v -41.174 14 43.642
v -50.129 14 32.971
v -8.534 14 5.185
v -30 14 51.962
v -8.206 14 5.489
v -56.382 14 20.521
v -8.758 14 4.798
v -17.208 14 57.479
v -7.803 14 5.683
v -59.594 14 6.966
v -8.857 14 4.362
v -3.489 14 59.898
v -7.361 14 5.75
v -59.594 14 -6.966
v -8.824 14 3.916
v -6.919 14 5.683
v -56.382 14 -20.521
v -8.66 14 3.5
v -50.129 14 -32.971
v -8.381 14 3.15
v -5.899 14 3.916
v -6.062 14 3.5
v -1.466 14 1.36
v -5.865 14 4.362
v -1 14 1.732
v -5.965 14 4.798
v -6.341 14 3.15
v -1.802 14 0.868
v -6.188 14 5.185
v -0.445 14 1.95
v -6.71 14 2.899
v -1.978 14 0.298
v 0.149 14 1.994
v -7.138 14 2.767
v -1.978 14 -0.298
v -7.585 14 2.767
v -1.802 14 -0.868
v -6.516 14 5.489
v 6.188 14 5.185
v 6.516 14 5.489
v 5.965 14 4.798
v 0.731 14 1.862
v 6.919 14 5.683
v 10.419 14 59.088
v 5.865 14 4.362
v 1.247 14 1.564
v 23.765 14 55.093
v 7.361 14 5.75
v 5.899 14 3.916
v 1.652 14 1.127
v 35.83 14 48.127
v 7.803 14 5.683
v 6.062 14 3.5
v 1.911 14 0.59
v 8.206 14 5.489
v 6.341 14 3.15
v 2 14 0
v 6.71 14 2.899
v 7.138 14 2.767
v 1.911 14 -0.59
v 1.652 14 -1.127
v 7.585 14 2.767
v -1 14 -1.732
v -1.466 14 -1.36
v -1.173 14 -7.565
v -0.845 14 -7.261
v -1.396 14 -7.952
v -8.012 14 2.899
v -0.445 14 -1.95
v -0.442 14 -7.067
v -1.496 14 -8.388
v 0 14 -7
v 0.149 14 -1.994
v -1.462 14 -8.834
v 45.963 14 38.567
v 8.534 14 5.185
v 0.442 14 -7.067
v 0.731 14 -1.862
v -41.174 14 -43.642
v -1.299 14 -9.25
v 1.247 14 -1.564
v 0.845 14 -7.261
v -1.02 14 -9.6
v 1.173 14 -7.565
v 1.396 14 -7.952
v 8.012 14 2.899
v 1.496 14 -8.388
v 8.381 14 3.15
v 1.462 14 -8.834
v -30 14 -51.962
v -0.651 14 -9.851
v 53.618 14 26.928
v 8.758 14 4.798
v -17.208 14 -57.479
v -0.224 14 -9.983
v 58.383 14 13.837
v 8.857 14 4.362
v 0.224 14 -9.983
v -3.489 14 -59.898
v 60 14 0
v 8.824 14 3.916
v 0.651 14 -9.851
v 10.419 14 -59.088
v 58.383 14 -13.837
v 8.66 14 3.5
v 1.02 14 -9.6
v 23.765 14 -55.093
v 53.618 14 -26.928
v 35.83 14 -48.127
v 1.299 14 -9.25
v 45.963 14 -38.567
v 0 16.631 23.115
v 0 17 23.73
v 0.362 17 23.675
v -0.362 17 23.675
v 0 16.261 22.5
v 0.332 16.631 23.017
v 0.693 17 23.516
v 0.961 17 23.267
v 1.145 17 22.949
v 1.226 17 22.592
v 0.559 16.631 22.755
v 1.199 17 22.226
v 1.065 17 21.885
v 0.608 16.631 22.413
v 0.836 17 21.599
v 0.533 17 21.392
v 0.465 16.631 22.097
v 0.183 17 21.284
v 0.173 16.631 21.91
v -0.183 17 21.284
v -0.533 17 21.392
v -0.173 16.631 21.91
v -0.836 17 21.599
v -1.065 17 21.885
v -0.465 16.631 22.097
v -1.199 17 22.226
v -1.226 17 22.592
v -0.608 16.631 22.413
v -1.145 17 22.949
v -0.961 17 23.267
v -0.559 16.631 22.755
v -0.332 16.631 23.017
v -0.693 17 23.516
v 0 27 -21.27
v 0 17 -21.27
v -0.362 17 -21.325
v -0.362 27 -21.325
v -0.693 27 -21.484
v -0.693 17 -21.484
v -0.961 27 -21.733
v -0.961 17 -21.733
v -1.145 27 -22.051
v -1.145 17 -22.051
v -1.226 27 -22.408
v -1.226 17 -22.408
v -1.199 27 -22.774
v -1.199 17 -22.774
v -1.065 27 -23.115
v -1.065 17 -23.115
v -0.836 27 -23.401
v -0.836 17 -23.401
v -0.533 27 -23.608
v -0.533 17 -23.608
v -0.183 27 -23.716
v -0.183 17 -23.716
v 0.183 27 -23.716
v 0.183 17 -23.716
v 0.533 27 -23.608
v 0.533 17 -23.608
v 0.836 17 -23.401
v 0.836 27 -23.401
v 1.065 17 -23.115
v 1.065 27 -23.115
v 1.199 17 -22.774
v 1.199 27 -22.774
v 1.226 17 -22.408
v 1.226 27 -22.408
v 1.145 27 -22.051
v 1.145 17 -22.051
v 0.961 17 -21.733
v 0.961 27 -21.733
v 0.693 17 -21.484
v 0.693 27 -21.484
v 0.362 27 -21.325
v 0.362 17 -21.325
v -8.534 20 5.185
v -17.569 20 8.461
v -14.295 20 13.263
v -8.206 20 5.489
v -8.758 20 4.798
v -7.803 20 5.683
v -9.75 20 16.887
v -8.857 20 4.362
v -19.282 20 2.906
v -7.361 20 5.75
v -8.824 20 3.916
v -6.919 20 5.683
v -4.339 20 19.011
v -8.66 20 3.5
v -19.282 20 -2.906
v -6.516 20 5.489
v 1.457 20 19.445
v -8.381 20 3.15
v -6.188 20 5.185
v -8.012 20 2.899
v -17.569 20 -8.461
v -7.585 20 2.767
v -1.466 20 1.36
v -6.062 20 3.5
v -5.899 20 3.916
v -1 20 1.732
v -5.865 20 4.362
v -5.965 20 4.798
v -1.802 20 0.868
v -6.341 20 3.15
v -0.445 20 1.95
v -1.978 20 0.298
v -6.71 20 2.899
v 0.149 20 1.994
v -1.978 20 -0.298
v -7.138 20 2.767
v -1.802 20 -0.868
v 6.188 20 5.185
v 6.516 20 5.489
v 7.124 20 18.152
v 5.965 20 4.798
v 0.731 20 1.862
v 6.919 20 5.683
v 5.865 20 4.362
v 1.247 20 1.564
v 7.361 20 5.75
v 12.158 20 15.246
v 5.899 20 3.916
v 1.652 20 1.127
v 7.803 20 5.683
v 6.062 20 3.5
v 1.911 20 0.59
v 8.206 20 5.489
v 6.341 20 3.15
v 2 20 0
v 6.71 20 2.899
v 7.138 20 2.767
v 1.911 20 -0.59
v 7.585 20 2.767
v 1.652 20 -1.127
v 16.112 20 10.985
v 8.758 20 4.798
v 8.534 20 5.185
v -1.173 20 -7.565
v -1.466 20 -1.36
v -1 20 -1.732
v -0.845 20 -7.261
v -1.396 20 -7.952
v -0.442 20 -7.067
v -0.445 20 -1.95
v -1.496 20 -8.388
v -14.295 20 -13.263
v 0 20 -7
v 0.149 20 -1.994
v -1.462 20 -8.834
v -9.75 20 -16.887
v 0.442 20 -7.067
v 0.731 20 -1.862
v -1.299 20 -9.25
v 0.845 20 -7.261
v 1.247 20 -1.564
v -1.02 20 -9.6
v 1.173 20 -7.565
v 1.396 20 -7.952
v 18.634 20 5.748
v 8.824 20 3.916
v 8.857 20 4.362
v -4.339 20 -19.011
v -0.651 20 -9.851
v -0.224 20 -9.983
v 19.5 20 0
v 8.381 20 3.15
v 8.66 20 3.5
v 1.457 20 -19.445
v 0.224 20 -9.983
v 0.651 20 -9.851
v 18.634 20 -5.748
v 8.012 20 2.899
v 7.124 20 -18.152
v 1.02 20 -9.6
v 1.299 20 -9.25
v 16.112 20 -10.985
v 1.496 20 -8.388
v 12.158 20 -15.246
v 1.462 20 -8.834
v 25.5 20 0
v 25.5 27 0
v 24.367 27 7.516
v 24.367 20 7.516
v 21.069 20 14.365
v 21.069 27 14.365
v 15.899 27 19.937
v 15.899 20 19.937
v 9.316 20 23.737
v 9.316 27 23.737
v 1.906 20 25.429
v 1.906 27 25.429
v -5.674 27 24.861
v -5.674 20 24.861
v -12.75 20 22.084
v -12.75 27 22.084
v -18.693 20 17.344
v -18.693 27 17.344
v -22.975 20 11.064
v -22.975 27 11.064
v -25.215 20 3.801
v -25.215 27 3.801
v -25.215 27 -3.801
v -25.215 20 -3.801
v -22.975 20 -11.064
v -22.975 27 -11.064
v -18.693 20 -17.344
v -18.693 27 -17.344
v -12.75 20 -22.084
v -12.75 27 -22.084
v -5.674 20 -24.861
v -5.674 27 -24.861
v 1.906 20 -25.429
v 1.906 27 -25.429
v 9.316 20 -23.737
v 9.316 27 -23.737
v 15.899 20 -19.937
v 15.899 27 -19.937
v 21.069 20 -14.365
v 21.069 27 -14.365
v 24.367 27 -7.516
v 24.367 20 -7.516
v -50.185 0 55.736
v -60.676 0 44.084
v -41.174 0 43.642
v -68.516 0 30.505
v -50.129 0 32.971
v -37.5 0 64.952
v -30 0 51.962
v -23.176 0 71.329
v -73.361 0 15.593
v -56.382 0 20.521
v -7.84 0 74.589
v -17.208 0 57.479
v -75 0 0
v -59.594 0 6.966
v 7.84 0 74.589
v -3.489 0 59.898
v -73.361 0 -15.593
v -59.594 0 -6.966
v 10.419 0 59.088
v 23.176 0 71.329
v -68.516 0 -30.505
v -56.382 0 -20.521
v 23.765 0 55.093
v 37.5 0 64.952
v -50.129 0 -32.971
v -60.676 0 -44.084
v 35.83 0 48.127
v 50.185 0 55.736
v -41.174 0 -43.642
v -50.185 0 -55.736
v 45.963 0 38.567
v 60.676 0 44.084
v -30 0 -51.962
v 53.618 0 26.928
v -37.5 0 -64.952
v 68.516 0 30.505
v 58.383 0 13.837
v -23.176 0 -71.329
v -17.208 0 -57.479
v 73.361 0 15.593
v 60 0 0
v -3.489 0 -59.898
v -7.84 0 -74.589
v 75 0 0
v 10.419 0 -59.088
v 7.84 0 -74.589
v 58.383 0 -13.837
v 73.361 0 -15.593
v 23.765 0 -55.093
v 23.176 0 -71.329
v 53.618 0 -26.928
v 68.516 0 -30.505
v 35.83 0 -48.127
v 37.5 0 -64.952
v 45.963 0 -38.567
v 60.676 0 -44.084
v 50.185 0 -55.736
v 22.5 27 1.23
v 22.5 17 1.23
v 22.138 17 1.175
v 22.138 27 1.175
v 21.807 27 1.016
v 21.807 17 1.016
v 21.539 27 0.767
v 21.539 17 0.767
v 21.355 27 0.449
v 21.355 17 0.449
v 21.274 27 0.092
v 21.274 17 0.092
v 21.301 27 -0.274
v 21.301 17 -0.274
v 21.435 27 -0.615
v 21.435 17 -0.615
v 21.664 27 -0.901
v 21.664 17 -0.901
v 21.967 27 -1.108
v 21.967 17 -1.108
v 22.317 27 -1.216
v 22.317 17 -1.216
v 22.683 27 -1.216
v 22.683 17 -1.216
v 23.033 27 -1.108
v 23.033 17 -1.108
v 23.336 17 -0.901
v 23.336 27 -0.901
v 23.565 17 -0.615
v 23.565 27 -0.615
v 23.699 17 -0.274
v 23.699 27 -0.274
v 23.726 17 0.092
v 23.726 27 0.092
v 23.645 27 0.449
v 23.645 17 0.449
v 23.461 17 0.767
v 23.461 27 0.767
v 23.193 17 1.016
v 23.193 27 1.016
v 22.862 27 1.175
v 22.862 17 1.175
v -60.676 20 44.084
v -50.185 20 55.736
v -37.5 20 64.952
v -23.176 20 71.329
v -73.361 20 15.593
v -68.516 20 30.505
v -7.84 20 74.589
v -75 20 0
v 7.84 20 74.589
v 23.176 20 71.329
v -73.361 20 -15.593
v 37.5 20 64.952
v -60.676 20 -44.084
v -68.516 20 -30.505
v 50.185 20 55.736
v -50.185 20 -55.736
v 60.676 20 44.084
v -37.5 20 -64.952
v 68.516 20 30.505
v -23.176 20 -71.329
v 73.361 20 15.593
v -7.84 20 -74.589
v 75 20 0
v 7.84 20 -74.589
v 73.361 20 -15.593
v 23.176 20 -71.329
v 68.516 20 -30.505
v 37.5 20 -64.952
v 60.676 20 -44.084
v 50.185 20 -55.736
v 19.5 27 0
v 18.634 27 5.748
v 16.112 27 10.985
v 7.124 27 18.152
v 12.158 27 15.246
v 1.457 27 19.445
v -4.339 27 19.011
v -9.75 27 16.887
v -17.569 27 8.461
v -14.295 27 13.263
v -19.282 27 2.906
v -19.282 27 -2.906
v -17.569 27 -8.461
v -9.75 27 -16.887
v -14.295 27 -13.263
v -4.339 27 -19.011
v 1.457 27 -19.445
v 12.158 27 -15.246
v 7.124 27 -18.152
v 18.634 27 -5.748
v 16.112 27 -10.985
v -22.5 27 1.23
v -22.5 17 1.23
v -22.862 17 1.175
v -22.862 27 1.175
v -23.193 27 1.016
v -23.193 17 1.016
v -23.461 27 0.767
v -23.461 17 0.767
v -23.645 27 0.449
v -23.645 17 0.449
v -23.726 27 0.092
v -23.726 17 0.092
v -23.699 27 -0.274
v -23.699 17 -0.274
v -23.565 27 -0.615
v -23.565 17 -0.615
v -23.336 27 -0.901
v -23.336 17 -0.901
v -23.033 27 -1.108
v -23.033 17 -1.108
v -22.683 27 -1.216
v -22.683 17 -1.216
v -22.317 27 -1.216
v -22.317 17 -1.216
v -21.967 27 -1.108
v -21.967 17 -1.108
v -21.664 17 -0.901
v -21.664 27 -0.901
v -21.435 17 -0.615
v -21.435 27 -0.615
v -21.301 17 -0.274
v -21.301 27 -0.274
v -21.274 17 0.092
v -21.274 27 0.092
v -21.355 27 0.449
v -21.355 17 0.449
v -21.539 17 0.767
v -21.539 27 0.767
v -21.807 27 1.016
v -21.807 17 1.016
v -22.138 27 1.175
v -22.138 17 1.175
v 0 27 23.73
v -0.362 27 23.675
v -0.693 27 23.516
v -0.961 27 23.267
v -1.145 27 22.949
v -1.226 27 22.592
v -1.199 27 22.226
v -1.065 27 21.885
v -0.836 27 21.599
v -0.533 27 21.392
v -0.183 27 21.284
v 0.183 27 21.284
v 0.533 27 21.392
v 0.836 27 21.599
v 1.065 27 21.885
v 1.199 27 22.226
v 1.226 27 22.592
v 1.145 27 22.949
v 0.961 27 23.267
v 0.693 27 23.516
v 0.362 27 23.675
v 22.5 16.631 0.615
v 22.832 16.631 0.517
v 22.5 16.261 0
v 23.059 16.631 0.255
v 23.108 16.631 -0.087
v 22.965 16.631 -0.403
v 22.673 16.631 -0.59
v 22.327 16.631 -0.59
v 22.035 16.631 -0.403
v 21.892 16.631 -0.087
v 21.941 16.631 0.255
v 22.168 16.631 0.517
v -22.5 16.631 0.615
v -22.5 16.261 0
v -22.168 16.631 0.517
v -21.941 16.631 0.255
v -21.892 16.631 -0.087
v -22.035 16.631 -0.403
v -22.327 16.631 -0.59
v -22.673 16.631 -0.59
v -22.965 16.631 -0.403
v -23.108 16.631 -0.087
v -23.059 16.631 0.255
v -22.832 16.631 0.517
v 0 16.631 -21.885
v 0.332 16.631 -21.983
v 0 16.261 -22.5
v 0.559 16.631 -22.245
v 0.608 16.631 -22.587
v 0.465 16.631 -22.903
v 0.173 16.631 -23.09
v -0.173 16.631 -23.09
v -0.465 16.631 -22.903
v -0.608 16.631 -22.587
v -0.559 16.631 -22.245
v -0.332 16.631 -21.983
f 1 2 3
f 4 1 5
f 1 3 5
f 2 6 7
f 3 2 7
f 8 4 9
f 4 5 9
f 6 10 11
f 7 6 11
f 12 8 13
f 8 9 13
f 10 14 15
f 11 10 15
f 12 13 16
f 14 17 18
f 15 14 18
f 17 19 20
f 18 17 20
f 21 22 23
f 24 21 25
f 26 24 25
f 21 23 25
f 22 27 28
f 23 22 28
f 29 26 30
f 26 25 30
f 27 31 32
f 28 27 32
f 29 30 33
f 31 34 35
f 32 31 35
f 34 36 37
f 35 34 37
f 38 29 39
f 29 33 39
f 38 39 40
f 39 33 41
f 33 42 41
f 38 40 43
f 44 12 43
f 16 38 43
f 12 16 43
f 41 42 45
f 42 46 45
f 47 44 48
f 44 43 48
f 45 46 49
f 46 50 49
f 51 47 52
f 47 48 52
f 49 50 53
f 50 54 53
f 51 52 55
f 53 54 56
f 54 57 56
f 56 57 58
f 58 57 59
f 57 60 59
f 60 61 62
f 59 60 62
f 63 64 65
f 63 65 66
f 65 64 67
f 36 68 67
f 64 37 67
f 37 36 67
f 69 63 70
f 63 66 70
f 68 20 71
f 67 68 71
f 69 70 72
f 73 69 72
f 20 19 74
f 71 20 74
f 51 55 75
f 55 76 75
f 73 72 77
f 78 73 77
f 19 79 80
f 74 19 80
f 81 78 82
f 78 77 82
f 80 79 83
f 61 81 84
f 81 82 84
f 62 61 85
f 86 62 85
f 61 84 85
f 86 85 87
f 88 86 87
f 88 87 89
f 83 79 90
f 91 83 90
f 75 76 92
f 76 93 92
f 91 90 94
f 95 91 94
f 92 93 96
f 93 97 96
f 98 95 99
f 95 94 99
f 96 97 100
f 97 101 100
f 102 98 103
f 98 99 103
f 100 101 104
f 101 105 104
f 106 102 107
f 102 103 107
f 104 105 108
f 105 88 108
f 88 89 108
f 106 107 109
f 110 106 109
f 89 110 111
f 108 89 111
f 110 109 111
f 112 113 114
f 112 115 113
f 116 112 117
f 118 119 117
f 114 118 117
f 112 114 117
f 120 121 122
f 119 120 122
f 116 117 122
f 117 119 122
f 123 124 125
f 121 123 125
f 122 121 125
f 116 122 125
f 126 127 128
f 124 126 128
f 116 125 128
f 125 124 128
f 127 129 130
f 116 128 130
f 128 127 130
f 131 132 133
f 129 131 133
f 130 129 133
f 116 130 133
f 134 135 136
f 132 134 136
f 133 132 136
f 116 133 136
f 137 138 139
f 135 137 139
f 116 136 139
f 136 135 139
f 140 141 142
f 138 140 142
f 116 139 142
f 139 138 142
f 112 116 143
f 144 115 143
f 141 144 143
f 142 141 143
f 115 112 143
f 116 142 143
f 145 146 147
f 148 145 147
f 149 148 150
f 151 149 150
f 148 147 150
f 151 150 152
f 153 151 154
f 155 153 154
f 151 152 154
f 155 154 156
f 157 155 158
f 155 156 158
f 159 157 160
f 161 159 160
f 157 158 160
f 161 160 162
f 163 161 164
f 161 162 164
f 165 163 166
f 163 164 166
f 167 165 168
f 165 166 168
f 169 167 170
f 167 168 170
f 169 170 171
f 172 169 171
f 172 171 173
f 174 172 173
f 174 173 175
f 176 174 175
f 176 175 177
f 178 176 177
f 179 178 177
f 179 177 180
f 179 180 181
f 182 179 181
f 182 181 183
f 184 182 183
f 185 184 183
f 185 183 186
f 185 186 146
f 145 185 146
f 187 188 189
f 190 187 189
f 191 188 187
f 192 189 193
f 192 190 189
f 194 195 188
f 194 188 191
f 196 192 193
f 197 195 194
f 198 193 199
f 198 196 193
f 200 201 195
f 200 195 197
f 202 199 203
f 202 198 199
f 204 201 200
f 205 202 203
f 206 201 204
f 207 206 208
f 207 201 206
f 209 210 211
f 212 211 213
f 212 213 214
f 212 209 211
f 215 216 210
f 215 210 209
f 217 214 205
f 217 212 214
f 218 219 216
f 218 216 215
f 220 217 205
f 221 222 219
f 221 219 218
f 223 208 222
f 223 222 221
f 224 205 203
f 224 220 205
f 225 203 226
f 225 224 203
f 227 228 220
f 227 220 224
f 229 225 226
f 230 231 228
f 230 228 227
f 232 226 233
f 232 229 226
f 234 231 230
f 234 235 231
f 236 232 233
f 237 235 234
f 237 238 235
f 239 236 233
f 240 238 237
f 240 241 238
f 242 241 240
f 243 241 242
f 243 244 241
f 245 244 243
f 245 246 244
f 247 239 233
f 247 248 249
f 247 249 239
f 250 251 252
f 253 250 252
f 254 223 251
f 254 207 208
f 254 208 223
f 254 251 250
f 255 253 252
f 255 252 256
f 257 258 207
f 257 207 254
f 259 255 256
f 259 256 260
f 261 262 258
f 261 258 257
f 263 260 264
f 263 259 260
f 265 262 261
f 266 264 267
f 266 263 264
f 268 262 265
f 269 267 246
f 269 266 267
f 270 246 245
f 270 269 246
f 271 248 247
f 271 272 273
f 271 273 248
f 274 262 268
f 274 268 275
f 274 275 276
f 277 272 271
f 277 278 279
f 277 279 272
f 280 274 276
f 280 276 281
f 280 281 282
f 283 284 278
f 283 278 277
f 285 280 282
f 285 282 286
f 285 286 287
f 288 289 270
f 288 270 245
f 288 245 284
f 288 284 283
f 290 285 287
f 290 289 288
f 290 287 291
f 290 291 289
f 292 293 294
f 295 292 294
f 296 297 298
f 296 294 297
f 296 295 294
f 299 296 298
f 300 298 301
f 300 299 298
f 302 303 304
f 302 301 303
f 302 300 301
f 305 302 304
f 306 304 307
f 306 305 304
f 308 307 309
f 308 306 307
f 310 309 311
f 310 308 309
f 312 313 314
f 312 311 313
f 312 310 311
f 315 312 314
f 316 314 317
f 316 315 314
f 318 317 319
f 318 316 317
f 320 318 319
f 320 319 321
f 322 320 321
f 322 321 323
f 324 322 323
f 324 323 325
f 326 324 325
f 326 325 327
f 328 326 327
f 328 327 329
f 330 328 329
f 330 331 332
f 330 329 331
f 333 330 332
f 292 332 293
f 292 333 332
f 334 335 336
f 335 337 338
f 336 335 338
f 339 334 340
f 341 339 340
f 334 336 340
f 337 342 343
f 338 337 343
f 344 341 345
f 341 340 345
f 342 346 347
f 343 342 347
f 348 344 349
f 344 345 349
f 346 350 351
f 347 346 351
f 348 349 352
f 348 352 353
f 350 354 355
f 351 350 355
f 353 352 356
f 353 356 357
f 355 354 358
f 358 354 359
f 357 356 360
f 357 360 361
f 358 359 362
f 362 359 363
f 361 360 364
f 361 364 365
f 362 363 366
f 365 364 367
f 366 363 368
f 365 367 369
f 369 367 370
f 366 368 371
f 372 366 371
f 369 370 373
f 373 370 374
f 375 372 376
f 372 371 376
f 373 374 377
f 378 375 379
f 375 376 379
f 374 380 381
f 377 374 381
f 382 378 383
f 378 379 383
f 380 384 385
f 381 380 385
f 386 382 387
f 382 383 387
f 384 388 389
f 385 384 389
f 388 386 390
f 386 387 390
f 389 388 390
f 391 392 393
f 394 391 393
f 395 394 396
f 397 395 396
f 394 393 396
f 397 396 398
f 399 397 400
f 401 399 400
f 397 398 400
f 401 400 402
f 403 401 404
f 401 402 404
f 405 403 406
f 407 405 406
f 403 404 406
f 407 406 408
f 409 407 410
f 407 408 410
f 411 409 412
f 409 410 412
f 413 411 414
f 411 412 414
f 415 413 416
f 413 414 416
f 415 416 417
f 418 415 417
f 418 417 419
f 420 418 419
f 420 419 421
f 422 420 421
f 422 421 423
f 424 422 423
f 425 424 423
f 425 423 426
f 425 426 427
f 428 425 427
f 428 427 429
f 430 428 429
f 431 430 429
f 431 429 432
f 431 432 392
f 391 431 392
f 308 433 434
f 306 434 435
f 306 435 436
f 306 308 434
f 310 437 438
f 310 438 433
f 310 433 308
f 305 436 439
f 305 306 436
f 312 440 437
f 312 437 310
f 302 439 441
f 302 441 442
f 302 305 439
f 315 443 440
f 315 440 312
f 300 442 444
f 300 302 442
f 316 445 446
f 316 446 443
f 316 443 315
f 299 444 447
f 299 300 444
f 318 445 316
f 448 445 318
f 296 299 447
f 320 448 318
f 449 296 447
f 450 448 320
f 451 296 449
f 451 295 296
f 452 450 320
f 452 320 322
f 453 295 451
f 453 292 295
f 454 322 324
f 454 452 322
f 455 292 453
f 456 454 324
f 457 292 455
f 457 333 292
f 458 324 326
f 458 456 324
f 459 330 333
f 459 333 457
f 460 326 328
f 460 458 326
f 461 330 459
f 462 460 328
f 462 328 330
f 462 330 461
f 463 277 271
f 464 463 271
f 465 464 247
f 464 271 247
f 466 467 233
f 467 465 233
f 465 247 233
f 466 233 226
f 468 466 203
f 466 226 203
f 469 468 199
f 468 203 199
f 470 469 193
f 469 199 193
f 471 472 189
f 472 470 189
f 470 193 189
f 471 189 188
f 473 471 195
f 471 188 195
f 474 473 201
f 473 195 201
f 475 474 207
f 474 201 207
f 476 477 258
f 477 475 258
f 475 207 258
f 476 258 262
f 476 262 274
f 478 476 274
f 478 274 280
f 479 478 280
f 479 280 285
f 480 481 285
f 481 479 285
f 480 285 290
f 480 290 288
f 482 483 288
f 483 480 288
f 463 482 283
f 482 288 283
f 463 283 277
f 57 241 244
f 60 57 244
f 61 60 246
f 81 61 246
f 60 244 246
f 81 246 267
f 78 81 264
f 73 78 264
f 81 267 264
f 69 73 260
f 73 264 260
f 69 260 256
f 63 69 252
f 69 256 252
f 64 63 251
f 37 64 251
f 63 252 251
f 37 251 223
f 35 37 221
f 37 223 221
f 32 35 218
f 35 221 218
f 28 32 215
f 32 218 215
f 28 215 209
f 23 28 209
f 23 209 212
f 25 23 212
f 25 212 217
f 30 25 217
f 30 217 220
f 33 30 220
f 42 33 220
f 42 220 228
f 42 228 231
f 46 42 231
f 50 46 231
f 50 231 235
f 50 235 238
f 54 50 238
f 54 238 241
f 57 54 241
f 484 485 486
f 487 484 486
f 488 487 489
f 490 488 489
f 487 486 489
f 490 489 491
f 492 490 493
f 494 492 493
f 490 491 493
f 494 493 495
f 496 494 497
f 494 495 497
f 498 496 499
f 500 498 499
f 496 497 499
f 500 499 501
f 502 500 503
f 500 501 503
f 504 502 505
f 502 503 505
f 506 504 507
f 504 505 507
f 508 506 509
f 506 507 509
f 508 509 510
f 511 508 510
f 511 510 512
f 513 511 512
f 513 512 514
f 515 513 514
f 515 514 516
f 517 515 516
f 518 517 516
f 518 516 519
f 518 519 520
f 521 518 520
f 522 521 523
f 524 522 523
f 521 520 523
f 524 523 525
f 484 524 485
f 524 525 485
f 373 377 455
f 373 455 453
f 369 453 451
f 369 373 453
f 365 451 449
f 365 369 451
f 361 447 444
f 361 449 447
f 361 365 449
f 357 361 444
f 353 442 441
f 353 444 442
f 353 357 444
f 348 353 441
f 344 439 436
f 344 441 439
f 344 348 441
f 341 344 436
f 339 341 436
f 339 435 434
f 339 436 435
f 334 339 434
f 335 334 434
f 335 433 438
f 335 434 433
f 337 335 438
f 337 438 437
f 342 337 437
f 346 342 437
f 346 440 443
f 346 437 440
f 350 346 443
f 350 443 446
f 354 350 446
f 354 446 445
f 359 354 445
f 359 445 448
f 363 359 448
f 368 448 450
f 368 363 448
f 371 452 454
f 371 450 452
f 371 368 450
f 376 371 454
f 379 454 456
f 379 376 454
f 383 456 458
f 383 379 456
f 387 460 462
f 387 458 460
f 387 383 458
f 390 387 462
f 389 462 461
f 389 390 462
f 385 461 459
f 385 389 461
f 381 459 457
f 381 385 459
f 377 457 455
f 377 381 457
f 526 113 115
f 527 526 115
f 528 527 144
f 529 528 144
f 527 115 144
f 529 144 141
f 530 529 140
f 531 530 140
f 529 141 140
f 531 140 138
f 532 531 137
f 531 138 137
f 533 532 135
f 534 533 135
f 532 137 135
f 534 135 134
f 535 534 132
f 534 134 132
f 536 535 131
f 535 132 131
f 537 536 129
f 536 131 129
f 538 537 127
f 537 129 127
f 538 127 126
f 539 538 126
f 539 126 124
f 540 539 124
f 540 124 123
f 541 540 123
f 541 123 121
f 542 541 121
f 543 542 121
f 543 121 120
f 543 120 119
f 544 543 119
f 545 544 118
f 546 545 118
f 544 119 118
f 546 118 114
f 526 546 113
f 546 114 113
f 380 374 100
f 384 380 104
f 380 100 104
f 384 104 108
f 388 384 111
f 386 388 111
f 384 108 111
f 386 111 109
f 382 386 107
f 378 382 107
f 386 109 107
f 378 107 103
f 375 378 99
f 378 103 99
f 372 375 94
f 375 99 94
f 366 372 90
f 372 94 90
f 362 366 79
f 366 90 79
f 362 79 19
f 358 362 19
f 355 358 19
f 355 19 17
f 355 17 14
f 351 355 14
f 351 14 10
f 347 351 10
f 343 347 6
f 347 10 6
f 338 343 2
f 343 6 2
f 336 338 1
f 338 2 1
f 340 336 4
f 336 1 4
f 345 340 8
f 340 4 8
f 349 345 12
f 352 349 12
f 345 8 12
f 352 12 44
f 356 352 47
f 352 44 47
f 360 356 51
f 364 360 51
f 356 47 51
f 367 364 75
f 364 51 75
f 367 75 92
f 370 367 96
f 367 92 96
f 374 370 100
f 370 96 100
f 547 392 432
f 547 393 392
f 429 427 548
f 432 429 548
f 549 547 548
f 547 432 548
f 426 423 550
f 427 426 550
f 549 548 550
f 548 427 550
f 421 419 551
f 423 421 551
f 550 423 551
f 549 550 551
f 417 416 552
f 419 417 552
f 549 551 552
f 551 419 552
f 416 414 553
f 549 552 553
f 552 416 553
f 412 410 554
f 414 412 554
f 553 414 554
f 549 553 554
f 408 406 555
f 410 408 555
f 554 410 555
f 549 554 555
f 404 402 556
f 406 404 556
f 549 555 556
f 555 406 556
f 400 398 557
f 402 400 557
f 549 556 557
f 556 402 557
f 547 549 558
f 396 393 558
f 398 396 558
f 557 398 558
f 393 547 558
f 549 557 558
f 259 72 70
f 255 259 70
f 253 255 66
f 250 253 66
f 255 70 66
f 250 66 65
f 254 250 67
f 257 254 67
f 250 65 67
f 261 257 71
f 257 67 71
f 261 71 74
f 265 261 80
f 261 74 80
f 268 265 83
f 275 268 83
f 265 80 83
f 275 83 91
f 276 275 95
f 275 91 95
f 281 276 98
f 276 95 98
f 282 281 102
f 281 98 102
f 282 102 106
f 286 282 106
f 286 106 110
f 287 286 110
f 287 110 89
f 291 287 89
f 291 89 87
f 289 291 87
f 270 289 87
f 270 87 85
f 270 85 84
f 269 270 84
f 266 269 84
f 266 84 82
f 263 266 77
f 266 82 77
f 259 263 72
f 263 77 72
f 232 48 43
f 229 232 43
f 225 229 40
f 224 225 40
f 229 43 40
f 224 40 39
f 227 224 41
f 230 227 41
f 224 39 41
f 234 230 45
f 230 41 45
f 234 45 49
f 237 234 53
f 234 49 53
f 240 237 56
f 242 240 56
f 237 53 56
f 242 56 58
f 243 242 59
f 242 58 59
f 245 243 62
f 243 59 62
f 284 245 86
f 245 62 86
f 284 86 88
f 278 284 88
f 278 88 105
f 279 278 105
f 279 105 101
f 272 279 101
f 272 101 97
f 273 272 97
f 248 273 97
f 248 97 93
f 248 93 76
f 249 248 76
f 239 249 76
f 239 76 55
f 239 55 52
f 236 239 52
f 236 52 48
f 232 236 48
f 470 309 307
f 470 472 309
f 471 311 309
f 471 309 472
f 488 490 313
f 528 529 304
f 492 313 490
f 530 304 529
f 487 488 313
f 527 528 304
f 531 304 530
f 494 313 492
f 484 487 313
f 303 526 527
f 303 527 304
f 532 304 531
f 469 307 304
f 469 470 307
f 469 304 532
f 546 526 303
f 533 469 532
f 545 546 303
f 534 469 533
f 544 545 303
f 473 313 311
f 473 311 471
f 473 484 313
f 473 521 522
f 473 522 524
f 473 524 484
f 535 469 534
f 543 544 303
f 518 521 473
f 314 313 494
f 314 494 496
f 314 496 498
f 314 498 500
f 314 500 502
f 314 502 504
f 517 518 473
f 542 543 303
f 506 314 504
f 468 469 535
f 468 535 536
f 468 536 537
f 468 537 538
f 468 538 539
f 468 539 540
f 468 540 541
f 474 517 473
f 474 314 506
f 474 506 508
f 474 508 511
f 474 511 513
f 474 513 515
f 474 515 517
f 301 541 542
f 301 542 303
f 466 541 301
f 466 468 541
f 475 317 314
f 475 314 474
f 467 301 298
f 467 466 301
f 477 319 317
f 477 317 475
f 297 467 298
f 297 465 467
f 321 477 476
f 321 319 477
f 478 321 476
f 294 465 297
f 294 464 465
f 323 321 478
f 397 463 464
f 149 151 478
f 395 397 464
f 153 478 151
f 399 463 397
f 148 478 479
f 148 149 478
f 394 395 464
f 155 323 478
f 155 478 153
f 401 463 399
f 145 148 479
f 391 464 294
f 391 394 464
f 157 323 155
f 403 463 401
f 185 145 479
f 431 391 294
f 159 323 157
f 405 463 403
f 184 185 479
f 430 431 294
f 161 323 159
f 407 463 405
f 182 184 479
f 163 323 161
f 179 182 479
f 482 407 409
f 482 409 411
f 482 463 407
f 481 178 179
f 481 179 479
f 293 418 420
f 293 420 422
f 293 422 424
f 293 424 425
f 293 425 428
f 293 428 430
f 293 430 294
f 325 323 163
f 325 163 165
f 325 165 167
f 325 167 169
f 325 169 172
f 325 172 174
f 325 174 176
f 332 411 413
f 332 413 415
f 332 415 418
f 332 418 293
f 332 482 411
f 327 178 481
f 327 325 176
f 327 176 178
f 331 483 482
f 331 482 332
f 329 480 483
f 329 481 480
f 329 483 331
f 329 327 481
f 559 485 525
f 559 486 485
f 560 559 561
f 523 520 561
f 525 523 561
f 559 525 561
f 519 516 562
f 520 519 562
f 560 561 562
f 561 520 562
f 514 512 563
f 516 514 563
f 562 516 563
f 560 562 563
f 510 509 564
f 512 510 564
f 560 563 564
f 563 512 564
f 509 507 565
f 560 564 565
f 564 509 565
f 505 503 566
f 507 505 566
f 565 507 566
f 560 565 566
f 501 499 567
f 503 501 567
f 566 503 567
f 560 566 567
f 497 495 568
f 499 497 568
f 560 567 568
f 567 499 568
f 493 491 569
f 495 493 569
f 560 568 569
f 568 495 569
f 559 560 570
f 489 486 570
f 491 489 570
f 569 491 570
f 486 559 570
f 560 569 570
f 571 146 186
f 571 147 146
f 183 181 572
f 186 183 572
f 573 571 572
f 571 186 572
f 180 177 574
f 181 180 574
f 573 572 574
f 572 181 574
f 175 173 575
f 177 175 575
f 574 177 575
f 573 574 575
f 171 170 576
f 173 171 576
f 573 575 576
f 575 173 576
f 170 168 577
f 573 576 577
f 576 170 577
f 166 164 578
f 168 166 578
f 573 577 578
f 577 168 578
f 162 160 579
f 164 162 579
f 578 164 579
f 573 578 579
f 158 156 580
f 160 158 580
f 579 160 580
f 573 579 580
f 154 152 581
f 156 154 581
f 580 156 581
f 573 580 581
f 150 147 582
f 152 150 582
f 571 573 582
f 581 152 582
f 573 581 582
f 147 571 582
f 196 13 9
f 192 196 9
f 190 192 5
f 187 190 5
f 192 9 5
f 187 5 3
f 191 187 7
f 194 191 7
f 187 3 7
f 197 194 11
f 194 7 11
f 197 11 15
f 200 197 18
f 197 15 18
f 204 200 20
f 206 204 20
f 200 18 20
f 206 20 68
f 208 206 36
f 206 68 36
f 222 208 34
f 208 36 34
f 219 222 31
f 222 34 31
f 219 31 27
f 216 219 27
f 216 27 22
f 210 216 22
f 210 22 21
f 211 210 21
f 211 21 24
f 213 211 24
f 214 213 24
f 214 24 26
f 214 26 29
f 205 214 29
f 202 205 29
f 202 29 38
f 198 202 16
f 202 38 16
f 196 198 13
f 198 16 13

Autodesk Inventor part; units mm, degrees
ref_plane "YZ Plane" through (0, 0, 0) normal (1, 0, 0) x (0, 1, 0)
ref_plane "XZ Plane" through (0, 0, 0) normal (0, 1, 0) x (-1, 0, 0)
ref_plane "XY Plane" through (0, 0, 0) normal (0, 0, 1) x (1, 0, 0)
sketch "Sketch1" plane through (0, 0, 0) normal (0, 0, 1) x (1, 0, 0)
  line L0 (0, 20) -> (75, 20)
  line L1 (75, 20) -> (75, 0)
  line L2 (75, 0) -> (60, 0)
  line L3 (60, 0) -> (60, 14)
  line L4 (60, 14) -> (0, 14)
  line L5 (0, 14) -> (0, 20)
  line L6 (-15, 0) -> (90, 0) projected
  line L7 (0, -4) -> (0, 24) projected
  point P0 (0, 0)
  dimension "d2" = 14
  dimension "d3" = 20
  dimension "d5" = 150
  dimension "d6" = 120
revolve "Revolution1" add sketch "Sketch1" angle 360 about axis through (0, 14, 0) along (0, 1, 0) contours L0 L1 L2 L3 L4 L5
sketch "Sketch2" plane through (0, 20, 0) normal (0, 1, 0) x (1, 0, 0)
  circle A0 centre (0, 0) radius 75 projected
  circle A1 centre (0, 0) radius 2
  dimension "d7" = 4
extrude "Extrusion1" cut sketch "Sketch2" against normal through all contours A1
sketch "Sketch3" plane through (0, 20, 0) normal (0, 1, 0) x (1, 0, 0)
  circle A0 centre (0, 0) radius 2 projected
  line L0 (0, 105) -> (0, -105) projected
  line L1 (-105, 0) -> (105, 0) projected
  point P0 (0, 8.5)
  point P1 (-7.3612, -4.25)
  point P2 (7.3612, -4.25)
  dimension "d10" = 8.5
  dimension "d13" = 360
hole "Hole1" at (0, 20, -8.5) at (-7.3612, 20, 4.25) at (7.3612, 20, 4.25) direction (0, -1, 0) diameter 3 end through all
sketch "Sketch4" plane through (0, 20, 0) normal (0, 1, 0) x (1, 0, 0)
  circle A0 centre (0, 0) radius 22.5
  circle A1 centre (0, 0) radius 25.5
  circle A2 centre (0, 0) radius 19.5
  dimension "d23" = 45
  dimension "d24" = 3
  dimension "d25" = 3
extrude "Extrusion2" add sketch "Sketch4" along normal blind 7 contours A0 | A1
sketch "Sketch5" plane through (0, 27, 0) normal (0, 1, 0) x (1, 0, 0)
  circle A0 centre (0, 0) radius 22.5
  point P0 (-22.5, 0)
  point P1 (0, -22.5)
  point P2 (22.5, 0)
  point P3 (0, 22.5)
  dimension "d28" = 45
hole "Hole2" at (-22.5, 27, 0) at (0, 27, 22.5) at (22.5, 27, 0) at (0, 27, -22.5) direction (0, -1, 0) diameter 2.459 depth 10 tip angle 118 thread size "M3x0.5" class "6H" standard "ANSI Metric M Profile"
properties part number "Wheel 2" material "Brass, Soft Yellow, Welded"
